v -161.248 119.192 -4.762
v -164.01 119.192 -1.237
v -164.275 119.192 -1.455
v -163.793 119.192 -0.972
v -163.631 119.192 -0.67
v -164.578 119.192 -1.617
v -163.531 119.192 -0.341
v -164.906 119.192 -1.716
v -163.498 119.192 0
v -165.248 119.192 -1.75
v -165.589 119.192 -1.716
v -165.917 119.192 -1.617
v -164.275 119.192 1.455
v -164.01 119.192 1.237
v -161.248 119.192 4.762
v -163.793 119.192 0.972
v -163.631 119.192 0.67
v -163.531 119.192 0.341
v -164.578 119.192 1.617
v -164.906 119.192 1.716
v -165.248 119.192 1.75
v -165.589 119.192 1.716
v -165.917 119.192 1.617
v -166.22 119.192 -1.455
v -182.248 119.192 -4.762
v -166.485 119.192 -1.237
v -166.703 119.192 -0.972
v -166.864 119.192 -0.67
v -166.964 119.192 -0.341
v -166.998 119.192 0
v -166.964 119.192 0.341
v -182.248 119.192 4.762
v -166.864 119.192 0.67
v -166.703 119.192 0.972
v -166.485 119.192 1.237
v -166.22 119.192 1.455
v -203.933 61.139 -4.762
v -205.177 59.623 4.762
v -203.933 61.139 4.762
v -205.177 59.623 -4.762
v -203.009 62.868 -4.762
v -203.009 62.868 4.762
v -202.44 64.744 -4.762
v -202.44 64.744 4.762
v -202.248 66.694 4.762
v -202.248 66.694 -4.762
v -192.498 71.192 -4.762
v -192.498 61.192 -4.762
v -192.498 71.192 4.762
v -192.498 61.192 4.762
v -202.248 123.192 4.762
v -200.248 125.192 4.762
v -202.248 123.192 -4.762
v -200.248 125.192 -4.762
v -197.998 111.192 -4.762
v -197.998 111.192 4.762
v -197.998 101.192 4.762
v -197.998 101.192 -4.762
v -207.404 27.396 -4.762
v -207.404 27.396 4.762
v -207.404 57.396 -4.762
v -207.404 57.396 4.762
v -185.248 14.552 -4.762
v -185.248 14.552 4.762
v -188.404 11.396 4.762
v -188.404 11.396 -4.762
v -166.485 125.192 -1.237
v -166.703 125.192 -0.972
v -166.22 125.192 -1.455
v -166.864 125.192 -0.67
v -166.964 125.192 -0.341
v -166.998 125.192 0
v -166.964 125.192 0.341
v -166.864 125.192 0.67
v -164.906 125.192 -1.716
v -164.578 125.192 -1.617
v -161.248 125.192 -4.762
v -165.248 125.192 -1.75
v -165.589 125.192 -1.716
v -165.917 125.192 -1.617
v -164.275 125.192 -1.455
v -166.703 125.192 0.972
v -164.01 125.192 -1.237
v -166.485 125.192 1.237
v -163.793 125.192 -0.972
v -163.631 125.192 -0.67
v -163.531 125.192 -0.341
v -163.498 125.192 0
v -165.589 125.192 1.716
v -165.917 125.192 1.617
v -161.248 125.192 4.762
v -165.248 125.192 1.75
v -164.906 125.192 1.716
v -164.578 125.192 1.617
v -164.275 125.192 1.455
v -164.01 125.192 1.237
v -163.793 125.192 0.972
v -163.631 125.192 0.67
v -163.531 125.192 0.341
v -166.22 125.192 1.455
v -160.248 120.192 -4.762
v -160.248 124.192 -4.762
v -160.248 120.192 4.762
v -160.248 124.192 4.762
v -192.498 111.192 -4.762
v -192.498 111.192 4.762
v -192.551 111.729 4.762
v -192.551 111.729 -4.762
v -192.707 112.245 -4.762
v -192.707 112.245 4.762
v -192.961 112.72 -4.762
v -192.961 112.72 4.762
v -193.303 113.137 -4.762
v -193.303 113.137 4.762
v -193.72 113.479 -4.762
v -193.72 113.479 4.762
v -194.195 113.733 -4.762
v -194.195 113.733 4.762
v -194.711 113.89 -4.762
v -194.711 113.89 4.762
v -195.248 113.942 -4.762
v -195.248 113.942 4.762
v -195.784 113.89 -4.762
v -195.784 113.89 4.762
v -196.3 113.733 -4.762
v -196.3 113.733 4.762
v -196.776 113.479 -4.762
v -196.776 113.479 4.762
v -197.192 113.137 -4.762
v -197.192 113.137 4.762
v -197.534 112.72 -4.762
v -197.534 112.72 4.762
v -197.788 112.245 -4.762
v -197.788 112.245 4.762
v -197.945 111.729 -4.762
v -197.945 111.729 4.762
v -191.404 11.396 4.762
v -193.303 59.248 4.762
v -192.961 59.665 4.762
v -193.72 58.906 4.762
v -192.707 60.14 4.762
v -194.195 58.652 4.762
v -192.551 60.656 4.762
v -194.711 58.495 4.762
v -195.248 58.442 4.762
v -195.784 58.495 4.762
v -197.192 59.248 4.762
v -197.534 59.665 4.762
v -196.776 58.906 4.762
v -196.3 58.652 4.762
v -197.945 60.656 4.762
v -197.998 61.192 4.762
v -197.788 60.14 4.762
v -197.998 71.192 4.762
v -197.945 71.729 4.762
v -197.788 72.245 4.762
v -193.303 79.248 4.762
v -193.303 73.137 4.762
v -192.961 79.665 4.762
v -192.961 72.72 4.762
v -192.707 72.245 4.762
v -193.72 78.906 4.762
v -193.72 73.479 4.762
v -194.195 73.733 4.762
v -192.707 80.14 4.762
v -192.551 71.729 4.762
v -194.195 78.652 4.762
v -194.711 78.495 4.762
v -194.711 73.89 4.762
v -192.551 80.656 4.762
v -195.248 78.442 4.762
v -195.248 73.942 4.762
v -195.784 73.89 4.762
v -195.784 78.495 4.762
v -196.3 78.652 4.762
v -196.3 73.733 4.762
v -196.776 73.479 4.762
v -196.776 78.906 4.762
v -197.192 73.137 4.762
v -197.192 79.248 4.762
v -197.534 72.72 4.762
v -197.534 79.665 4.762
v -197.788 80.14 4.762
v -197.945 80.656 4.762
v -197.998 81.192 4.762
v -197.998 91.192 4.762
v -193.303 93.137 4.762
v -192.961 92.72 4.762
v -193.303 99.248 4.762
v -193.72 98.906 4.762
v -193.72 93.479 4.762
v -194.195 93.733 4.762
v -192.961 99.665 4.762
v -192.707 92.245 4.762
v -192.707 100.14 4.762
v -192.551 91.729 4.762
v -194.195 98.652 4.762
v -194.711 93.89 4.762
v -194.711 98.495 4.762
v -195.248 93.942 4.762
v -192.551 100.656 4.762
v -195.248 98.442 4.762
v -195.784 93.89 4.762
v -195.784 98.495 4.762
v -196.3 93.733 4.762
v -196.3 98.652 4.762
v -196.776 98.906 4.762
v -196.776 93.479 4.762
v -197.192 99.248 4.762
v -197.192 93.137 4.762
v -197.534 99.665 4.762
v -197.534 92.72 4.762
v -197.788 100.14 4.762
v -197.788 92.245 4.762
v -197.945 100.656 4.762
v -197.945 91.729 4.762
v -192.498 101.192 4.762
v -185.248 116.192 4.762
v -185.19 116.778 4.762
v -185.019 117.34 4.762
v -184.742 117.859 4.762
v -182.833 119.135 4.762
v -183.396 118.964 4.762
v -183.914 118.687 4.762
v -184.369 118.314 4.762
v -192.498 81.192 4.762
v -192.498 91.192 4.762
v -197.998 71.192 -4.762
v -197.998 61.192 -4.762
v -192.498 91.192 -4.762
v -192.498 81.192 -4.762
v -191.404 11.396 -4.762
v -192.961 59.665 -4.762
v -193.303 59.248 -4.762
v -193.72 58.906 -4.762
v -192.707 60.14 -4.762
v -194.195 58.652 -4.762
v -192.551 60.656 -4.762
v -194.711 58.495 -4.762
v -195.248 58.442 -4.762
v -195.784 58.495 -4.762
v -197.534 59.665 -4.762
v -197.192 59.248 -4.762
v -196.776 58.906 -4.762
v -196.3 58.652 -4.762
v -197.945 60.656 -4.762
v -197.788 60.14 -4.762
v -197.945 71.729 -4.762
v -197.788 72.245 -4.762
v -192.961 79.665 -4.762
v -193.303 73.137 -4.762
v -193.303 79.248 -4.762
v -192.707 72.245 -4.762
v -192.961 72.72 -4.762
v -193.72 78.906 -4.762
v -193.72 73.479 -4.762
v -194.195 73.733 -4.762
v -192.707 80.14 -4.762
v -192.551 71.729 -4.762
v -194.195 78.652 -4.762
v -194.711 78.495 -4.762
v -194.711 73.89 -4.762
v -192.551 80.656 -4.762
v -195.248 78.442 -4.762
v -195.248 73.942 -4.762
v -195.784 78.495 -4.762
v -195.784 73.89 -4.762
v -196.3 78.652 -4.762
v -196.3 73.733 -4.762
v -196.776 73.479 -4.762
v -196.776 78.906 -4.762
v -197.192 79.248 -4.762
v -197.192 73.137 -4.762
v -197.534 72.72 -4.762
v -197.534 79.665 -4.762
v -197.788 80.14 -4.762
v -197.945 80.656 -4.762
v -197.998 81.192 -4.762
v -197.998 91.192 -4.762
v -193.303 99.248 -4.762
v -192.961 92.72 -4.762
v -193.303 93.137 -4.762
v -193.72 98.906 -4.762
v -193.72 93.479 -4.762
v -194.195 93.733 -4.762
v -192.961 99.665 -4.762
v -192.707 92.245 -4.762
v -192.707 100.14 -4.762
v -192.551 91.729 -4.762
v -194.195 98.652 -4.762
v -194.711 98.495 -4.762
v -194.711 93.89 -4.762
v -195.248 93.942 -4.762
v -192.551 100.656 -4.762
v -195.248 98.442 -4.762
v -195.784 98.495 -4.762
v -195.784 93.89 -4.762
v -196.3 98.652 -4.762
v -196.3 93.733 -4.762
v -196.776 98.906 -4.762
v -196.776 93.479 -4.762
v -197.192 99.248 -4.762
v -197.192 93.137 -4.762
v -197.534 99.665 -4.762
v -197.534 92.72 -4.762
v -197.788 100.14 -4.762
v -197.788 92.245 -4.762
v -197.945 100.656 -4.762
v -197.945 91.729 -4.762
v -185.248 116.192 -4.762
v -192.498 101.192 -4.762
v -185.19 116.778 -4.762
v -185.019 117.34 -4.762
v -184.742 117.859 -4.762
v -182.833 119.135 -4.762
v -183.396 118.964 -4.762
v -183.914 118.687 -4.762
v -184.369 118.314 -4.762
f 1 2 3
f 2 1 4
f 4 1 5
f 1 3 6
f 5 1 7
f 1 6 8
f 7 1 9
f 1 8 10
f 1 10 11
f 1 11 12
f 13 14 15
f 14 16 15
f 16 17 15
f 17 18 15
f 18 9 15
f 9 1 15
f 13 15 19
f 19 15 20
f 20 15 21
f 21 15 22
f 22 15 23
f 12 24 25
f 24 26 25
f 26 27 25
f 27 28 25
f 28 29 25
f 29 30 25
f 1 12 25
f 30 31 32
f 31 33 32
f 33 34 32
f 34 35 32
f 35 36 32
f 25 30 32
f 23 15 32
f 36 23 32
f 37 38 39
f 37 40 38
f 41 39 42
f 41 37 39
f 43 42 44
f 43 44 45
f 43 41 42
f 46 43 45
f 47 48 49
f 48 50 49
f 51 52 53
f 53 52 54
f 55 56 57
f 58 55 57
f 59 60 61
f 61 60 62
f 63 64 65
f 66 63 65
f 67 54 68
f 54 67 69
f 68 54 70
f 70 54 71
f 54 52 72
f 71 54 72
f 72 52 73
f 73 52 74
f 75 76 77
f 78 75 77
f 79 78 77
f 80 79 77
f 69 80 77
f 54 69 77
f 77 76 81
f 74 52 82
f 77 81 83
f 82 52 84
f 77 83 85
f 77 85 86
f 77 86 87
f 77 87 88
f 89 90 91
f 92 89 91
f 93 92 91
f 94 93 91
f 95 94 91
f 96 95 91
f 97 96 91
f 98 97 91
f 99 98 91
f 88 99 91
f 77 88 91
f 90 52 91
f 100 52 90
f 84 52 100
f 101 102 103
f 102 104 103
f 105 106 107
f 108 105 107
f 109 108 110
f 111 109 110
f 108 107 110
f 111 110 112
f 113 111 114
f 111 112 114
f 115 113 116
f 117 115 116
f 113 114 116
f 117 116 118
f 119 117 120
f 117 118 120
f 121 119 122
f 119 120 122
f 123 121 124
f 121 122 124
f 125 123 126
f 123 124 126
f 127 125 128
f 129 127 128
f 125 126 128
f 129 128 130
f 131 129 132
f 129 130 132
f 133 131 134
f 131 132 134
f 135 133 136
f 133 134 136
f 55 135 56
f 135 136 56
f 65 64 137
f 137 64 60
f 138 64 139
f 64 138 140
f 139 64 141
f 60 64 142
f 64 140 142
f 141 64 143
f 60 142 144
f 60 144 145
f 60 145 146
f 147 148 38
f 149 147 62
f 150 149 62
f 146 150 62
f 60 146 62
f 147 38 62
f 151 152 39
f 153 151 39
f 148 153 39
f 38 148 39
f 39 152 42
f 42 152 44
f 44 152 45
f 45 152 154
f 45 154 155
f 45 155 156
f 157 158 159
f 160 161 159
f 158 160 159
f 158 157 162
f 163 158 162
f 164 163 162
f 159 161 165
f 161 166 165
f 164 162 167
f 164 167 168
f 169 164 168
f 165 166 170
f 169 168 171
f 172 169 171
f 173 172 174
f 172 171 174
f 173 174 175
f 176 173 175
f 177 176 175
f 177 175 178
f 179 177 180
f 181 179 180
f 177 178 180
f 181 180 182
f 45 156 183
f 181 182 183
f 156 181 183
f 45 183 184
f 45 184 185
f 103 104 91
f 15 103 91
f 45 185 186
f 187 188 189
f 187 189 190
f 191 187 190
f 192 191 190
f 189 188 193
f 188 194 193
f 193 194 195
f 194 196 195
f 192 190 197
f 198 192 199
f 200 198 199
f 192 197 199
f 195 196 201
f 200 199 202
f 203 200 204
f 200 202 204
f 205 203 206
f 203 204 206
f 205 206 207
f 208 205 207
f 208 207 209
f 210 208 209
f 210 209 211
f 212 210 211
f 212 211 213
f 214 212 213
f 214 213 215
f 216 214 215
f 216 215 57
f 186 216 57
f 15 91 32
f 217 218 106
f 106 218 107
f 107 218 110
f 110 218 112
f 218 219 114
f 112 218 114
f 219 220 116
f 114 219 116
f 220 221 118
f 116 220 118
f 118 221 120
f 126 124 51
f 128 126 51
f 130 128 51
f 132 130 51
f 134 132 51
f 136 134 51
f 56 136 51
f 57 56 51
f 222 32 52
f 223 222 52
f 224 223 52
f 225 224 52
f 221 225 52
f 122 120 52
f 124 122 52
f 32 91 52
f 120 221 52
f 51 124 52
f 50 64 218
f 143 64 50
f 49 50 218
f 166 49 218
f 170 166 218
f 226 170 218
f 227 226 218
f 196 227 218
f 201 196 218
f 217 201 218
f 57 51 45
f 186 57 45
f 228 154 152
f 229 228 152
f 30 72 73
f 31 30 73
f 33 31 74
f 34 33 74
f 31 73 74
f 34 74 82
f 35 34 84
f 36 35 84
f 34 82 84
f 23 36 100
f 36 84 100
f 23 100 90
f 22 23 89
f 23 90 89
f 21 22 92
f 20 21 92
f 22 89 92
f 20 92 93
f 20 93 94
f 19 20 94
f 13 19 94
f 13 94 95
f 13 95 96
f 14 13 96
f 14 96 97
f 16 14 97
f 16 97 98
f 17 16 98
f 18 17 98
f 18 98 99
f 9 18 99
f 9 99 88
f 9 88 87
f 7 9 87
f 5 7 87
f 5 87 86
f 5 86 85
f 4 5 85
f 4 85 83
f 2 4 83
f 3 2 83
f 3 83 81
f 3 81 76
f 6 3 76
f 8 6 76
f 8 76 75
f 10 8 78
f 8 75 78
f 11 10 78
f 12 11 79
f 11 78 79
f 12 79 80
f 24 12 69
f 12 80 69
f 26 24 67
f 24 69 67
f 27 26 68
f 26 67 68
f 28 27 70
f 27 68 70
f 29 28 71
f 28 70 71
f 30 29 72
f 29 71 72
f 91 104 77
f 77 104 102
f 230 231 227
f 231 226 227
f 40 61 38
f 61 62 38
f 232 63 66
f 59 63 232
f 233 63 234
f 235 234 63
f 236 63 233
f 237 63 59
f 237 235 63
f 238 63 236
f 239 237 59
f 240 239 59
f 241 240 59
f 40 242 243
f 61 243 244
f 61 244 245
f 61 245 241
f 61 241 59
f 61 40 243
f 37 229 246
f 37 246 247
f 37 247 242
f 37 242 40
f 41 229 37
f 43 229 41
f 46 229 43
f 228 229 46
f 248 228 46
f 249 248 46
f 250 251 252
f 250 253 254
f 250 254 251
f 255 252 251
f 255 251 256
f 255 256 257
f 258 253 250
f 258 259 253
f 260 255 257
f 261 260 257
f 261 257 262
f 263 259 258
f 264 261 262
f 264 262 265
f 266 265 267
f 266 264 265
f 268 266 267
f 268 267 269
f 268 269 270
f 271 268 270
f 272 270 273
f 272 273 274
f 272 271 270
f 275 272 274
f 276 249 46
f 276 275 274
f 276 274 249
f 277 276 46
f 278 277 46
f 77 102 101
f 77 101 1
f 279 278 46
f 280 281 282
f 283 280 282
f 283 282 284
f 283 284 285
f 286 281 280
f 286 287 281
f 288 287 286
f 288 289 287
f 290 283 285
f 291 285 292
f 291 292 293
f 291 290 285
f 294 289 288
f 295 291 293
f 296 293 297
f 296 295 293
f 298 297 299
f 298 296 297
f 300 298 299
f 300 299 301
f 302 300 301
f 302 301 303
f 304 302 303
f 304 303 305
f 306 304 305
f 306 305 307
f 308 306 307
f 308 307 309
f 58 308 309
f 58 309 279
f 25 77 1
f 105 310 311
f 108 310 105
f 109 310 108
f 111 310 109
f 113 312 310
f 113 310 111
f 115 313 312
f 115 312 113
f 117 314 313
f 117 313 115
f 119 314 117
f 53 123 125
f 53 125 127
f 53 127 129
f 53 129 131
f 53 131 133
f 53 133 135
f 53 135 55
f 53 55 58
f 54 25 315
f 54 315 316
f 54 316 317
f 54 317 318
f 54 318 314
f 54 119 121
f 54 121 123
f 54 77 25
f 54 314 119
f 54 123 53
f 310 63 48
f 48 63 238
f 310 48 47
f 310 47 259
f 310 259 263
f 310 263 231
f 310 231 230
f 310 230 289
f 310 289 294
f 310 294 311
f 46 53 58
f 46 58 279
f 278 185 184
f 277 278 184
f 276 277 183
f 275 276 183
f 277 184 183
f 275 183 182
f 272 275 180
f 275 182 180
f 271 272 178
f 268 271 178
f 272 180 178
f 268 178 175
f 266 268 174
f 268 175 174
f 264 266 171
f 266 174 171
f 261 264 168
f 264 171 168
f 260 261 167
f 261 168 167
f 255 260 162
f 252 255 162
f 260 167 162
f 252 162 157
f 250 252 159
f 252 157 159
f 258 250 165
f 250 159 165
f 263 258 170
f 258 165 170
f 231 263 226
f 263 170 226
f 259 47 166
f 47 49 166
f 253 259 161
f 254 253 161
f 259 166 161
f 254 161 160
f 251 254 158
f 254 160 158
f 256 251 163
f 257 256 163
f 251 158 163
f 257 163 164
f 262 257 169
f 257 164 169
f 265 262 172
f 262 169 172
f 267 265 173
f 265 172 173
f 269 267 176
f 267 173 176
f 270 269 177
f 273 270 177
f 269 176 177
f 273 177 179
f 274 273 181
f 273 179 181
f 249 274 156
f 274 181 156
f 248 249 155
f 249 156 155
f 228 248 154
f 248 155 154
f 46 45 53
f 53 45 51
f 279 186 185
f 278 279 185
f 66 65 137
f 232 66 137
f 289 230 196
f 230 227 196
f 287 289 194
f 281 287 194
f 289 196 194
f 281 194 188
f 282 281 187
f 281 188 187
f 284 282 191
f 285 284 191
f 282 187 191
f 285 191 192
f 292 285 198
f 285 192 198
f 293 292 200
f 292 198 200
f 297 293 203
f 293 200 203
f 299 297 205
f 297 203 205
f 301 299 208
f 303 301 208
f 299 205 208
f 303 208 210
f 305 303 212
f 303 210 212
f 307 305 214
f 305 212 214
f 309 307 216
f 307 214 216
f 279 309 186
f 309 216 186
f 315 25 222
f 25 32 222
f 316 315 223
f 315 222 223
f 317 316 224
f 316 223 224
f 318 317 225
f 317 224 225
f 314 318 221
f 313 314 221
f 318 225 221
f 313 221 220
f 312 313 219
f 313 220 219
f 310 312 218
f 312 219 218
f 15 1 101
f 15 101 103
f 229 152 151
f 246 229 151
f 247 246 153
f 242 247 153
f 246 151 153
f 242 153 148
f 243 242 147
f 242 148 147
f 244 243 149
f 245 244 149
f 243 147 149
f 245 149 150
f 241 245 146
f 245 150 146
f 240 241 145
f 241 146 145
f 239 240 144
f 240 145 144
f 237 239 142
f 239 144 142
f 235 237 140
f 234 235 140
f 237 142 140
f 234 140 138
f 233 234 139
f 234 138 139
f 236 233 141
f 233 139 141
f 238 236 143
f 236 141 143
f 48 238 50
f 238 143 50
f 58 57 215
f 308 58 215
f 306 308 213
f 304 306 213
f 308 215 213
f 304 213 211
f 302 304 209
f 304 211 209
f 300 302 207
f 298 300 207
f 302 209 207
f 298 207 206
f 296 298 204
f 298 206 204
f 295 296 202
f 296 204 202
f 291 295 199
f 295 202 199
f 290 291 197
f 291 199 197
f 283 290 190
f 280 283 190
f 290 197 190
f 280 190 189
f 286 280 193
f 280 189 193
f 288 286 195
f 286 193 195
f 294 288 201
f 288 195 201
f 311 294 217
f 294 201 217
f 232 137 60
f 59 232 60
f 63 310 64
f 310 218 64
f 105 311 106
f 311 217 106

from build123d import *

# Parameters (mm, degrees)
BOSS_EXTRUDE1_DEPTH      = 4.7625
BOSS_EXTRUDE1_DEPTH_BACK = 4.7625
SKETCH2_R                = 1.75
CUT_EXTRUDE1_DEPTH       = 237.61909032
FILLET1_R                = 10
CHAMFER1_SIZE            = 2
CHAMFER2_SIZE            = 1
FILLET2_R                = 3


with BuildPart() as part:
    # Sketch1 → Boss-Extrude1 (new, two sides: drawn at the far end of the back side and taken through both)
    with BuildSketch(Plane.XY.offset(-BOSS_EXTRUDE1_DEPTH_BACK)):
        Polygon((-191.403805922, 11.396194078), (-207.403805922, 27.396194078), (-207.403805922, 57.396194078), (-202.247691321, 62.552308679), (-202.247691321, 125.192388155), (-160.247691321, 125.192388155), (-160.247691321, 119.192388155), (-185.247691321, 119.192388155), (-185.247691321, 14.552308679), (-188.403805922, 11.396194078), align=None)
        with BuildLine():
            Line((-192.497691321, 61.192388155), (-192.497691321, 71.192388155))
            ThreePointArc((-192.497691321, 71.192388155), (-195.247691321, 73.942388155), (-197.997691321, 71.192388155))
            Line((-197.997691321, 71.192388155), (-197.997691321, 61.192388155))
            ThreePointArc((-197.997691321, 61.192388155), (-195.247691321, 58.442388155), (-192.497691321, 61.192388155))
        make_face(mode=Mode.SUBTRACT)
        with BuildLine():
            Line((-192.497691321, 81.192388155), (-192.497691321, 91.192388155))
            ThreePointArc((-192.497691321, 91.192388155), (-195.247691321, 93.942388155), (-197.997691321, 91.192388155))
            Line((-197.997691321, 91.192388155), (-197.997691321, 81.192388155))
            ThreePointArc((-197.997691321, 81.192388155), (-195.247691321, 78.442388155), (-192.497691321, 81.192388155))
        make_face(mode=Mode.SUBTRACT)
        with BuildLine():
            Line((-192.497691321, 101.192388155), (-192.497691321, 111.192388155))
            ThreePointArc((-192.497691321, 111.192388155), (-195.247691321, 113.942388155), (-197.997691321, 111.192388155))
            Line((-197.997691321, 111.192388155), (-197.997691321, 101.192388155))
            ThreePointArc((-197.997691321, 101.192388155), (-195.247691321, 98.442388155), (-192.497691321, 101.192388155))
        make_face(mode=Mode.SUBTRACT)
    extrude(amount=BOSS_EXTRUDE1_DEPTH + BOSS_EXTRUDE1_DEPTH_BACK)

    # Sketch2 → Cut-Extrude1 (cut, through all)
    with BuildSketch(Plane(origin=(0, 125.192388155, 0), x_dir=(-1, 0, 0), z_dir=(0, 1, 0))):
        with Locations((165.247691321, 0)):
            Circle(SKETCH2_R)
    extrude(amount=-CUT_EXTRUDE1_DEPTH, mode=Mode.SUBTRACT)

    # Fillet1
    fillet1_edges = [part.edges().sort_by_distance(p)[0] for p in [
        (-202.247691321, 62.552308679, 0),
    ]]
    fillet(fillet1_edges, radius=FILLET1_R)

    # Chamfer1
    chamfer1_edges = [part.edges().sort_by_distance(p)[0] for p in [
        (-202.247691321, 125.192388155, 0),
    ]]
    chamfer(chamfer1_edges, length=CHAMFER1_SIZE)

    # Chamfer2
    chamfer2_edges = [part.edges().sort_by_distance(p)[0] for p in [
        (-160.247691321, 125.192388155, 0),
        (-160.247691321, 119.192388155, 0),
    ]]
    chamfer(chamfer2_edges, length=CHAMFER2_SIZE)

    # Fillet2
    fillet2_edges = [part.edges().sort_by_distance(p)[0] for p in [
        (-185.247691321, 119.192388155, 0),
    ]]
    fillet(fillet2_edges, radius=FILLET2_R)


solid = part.part
